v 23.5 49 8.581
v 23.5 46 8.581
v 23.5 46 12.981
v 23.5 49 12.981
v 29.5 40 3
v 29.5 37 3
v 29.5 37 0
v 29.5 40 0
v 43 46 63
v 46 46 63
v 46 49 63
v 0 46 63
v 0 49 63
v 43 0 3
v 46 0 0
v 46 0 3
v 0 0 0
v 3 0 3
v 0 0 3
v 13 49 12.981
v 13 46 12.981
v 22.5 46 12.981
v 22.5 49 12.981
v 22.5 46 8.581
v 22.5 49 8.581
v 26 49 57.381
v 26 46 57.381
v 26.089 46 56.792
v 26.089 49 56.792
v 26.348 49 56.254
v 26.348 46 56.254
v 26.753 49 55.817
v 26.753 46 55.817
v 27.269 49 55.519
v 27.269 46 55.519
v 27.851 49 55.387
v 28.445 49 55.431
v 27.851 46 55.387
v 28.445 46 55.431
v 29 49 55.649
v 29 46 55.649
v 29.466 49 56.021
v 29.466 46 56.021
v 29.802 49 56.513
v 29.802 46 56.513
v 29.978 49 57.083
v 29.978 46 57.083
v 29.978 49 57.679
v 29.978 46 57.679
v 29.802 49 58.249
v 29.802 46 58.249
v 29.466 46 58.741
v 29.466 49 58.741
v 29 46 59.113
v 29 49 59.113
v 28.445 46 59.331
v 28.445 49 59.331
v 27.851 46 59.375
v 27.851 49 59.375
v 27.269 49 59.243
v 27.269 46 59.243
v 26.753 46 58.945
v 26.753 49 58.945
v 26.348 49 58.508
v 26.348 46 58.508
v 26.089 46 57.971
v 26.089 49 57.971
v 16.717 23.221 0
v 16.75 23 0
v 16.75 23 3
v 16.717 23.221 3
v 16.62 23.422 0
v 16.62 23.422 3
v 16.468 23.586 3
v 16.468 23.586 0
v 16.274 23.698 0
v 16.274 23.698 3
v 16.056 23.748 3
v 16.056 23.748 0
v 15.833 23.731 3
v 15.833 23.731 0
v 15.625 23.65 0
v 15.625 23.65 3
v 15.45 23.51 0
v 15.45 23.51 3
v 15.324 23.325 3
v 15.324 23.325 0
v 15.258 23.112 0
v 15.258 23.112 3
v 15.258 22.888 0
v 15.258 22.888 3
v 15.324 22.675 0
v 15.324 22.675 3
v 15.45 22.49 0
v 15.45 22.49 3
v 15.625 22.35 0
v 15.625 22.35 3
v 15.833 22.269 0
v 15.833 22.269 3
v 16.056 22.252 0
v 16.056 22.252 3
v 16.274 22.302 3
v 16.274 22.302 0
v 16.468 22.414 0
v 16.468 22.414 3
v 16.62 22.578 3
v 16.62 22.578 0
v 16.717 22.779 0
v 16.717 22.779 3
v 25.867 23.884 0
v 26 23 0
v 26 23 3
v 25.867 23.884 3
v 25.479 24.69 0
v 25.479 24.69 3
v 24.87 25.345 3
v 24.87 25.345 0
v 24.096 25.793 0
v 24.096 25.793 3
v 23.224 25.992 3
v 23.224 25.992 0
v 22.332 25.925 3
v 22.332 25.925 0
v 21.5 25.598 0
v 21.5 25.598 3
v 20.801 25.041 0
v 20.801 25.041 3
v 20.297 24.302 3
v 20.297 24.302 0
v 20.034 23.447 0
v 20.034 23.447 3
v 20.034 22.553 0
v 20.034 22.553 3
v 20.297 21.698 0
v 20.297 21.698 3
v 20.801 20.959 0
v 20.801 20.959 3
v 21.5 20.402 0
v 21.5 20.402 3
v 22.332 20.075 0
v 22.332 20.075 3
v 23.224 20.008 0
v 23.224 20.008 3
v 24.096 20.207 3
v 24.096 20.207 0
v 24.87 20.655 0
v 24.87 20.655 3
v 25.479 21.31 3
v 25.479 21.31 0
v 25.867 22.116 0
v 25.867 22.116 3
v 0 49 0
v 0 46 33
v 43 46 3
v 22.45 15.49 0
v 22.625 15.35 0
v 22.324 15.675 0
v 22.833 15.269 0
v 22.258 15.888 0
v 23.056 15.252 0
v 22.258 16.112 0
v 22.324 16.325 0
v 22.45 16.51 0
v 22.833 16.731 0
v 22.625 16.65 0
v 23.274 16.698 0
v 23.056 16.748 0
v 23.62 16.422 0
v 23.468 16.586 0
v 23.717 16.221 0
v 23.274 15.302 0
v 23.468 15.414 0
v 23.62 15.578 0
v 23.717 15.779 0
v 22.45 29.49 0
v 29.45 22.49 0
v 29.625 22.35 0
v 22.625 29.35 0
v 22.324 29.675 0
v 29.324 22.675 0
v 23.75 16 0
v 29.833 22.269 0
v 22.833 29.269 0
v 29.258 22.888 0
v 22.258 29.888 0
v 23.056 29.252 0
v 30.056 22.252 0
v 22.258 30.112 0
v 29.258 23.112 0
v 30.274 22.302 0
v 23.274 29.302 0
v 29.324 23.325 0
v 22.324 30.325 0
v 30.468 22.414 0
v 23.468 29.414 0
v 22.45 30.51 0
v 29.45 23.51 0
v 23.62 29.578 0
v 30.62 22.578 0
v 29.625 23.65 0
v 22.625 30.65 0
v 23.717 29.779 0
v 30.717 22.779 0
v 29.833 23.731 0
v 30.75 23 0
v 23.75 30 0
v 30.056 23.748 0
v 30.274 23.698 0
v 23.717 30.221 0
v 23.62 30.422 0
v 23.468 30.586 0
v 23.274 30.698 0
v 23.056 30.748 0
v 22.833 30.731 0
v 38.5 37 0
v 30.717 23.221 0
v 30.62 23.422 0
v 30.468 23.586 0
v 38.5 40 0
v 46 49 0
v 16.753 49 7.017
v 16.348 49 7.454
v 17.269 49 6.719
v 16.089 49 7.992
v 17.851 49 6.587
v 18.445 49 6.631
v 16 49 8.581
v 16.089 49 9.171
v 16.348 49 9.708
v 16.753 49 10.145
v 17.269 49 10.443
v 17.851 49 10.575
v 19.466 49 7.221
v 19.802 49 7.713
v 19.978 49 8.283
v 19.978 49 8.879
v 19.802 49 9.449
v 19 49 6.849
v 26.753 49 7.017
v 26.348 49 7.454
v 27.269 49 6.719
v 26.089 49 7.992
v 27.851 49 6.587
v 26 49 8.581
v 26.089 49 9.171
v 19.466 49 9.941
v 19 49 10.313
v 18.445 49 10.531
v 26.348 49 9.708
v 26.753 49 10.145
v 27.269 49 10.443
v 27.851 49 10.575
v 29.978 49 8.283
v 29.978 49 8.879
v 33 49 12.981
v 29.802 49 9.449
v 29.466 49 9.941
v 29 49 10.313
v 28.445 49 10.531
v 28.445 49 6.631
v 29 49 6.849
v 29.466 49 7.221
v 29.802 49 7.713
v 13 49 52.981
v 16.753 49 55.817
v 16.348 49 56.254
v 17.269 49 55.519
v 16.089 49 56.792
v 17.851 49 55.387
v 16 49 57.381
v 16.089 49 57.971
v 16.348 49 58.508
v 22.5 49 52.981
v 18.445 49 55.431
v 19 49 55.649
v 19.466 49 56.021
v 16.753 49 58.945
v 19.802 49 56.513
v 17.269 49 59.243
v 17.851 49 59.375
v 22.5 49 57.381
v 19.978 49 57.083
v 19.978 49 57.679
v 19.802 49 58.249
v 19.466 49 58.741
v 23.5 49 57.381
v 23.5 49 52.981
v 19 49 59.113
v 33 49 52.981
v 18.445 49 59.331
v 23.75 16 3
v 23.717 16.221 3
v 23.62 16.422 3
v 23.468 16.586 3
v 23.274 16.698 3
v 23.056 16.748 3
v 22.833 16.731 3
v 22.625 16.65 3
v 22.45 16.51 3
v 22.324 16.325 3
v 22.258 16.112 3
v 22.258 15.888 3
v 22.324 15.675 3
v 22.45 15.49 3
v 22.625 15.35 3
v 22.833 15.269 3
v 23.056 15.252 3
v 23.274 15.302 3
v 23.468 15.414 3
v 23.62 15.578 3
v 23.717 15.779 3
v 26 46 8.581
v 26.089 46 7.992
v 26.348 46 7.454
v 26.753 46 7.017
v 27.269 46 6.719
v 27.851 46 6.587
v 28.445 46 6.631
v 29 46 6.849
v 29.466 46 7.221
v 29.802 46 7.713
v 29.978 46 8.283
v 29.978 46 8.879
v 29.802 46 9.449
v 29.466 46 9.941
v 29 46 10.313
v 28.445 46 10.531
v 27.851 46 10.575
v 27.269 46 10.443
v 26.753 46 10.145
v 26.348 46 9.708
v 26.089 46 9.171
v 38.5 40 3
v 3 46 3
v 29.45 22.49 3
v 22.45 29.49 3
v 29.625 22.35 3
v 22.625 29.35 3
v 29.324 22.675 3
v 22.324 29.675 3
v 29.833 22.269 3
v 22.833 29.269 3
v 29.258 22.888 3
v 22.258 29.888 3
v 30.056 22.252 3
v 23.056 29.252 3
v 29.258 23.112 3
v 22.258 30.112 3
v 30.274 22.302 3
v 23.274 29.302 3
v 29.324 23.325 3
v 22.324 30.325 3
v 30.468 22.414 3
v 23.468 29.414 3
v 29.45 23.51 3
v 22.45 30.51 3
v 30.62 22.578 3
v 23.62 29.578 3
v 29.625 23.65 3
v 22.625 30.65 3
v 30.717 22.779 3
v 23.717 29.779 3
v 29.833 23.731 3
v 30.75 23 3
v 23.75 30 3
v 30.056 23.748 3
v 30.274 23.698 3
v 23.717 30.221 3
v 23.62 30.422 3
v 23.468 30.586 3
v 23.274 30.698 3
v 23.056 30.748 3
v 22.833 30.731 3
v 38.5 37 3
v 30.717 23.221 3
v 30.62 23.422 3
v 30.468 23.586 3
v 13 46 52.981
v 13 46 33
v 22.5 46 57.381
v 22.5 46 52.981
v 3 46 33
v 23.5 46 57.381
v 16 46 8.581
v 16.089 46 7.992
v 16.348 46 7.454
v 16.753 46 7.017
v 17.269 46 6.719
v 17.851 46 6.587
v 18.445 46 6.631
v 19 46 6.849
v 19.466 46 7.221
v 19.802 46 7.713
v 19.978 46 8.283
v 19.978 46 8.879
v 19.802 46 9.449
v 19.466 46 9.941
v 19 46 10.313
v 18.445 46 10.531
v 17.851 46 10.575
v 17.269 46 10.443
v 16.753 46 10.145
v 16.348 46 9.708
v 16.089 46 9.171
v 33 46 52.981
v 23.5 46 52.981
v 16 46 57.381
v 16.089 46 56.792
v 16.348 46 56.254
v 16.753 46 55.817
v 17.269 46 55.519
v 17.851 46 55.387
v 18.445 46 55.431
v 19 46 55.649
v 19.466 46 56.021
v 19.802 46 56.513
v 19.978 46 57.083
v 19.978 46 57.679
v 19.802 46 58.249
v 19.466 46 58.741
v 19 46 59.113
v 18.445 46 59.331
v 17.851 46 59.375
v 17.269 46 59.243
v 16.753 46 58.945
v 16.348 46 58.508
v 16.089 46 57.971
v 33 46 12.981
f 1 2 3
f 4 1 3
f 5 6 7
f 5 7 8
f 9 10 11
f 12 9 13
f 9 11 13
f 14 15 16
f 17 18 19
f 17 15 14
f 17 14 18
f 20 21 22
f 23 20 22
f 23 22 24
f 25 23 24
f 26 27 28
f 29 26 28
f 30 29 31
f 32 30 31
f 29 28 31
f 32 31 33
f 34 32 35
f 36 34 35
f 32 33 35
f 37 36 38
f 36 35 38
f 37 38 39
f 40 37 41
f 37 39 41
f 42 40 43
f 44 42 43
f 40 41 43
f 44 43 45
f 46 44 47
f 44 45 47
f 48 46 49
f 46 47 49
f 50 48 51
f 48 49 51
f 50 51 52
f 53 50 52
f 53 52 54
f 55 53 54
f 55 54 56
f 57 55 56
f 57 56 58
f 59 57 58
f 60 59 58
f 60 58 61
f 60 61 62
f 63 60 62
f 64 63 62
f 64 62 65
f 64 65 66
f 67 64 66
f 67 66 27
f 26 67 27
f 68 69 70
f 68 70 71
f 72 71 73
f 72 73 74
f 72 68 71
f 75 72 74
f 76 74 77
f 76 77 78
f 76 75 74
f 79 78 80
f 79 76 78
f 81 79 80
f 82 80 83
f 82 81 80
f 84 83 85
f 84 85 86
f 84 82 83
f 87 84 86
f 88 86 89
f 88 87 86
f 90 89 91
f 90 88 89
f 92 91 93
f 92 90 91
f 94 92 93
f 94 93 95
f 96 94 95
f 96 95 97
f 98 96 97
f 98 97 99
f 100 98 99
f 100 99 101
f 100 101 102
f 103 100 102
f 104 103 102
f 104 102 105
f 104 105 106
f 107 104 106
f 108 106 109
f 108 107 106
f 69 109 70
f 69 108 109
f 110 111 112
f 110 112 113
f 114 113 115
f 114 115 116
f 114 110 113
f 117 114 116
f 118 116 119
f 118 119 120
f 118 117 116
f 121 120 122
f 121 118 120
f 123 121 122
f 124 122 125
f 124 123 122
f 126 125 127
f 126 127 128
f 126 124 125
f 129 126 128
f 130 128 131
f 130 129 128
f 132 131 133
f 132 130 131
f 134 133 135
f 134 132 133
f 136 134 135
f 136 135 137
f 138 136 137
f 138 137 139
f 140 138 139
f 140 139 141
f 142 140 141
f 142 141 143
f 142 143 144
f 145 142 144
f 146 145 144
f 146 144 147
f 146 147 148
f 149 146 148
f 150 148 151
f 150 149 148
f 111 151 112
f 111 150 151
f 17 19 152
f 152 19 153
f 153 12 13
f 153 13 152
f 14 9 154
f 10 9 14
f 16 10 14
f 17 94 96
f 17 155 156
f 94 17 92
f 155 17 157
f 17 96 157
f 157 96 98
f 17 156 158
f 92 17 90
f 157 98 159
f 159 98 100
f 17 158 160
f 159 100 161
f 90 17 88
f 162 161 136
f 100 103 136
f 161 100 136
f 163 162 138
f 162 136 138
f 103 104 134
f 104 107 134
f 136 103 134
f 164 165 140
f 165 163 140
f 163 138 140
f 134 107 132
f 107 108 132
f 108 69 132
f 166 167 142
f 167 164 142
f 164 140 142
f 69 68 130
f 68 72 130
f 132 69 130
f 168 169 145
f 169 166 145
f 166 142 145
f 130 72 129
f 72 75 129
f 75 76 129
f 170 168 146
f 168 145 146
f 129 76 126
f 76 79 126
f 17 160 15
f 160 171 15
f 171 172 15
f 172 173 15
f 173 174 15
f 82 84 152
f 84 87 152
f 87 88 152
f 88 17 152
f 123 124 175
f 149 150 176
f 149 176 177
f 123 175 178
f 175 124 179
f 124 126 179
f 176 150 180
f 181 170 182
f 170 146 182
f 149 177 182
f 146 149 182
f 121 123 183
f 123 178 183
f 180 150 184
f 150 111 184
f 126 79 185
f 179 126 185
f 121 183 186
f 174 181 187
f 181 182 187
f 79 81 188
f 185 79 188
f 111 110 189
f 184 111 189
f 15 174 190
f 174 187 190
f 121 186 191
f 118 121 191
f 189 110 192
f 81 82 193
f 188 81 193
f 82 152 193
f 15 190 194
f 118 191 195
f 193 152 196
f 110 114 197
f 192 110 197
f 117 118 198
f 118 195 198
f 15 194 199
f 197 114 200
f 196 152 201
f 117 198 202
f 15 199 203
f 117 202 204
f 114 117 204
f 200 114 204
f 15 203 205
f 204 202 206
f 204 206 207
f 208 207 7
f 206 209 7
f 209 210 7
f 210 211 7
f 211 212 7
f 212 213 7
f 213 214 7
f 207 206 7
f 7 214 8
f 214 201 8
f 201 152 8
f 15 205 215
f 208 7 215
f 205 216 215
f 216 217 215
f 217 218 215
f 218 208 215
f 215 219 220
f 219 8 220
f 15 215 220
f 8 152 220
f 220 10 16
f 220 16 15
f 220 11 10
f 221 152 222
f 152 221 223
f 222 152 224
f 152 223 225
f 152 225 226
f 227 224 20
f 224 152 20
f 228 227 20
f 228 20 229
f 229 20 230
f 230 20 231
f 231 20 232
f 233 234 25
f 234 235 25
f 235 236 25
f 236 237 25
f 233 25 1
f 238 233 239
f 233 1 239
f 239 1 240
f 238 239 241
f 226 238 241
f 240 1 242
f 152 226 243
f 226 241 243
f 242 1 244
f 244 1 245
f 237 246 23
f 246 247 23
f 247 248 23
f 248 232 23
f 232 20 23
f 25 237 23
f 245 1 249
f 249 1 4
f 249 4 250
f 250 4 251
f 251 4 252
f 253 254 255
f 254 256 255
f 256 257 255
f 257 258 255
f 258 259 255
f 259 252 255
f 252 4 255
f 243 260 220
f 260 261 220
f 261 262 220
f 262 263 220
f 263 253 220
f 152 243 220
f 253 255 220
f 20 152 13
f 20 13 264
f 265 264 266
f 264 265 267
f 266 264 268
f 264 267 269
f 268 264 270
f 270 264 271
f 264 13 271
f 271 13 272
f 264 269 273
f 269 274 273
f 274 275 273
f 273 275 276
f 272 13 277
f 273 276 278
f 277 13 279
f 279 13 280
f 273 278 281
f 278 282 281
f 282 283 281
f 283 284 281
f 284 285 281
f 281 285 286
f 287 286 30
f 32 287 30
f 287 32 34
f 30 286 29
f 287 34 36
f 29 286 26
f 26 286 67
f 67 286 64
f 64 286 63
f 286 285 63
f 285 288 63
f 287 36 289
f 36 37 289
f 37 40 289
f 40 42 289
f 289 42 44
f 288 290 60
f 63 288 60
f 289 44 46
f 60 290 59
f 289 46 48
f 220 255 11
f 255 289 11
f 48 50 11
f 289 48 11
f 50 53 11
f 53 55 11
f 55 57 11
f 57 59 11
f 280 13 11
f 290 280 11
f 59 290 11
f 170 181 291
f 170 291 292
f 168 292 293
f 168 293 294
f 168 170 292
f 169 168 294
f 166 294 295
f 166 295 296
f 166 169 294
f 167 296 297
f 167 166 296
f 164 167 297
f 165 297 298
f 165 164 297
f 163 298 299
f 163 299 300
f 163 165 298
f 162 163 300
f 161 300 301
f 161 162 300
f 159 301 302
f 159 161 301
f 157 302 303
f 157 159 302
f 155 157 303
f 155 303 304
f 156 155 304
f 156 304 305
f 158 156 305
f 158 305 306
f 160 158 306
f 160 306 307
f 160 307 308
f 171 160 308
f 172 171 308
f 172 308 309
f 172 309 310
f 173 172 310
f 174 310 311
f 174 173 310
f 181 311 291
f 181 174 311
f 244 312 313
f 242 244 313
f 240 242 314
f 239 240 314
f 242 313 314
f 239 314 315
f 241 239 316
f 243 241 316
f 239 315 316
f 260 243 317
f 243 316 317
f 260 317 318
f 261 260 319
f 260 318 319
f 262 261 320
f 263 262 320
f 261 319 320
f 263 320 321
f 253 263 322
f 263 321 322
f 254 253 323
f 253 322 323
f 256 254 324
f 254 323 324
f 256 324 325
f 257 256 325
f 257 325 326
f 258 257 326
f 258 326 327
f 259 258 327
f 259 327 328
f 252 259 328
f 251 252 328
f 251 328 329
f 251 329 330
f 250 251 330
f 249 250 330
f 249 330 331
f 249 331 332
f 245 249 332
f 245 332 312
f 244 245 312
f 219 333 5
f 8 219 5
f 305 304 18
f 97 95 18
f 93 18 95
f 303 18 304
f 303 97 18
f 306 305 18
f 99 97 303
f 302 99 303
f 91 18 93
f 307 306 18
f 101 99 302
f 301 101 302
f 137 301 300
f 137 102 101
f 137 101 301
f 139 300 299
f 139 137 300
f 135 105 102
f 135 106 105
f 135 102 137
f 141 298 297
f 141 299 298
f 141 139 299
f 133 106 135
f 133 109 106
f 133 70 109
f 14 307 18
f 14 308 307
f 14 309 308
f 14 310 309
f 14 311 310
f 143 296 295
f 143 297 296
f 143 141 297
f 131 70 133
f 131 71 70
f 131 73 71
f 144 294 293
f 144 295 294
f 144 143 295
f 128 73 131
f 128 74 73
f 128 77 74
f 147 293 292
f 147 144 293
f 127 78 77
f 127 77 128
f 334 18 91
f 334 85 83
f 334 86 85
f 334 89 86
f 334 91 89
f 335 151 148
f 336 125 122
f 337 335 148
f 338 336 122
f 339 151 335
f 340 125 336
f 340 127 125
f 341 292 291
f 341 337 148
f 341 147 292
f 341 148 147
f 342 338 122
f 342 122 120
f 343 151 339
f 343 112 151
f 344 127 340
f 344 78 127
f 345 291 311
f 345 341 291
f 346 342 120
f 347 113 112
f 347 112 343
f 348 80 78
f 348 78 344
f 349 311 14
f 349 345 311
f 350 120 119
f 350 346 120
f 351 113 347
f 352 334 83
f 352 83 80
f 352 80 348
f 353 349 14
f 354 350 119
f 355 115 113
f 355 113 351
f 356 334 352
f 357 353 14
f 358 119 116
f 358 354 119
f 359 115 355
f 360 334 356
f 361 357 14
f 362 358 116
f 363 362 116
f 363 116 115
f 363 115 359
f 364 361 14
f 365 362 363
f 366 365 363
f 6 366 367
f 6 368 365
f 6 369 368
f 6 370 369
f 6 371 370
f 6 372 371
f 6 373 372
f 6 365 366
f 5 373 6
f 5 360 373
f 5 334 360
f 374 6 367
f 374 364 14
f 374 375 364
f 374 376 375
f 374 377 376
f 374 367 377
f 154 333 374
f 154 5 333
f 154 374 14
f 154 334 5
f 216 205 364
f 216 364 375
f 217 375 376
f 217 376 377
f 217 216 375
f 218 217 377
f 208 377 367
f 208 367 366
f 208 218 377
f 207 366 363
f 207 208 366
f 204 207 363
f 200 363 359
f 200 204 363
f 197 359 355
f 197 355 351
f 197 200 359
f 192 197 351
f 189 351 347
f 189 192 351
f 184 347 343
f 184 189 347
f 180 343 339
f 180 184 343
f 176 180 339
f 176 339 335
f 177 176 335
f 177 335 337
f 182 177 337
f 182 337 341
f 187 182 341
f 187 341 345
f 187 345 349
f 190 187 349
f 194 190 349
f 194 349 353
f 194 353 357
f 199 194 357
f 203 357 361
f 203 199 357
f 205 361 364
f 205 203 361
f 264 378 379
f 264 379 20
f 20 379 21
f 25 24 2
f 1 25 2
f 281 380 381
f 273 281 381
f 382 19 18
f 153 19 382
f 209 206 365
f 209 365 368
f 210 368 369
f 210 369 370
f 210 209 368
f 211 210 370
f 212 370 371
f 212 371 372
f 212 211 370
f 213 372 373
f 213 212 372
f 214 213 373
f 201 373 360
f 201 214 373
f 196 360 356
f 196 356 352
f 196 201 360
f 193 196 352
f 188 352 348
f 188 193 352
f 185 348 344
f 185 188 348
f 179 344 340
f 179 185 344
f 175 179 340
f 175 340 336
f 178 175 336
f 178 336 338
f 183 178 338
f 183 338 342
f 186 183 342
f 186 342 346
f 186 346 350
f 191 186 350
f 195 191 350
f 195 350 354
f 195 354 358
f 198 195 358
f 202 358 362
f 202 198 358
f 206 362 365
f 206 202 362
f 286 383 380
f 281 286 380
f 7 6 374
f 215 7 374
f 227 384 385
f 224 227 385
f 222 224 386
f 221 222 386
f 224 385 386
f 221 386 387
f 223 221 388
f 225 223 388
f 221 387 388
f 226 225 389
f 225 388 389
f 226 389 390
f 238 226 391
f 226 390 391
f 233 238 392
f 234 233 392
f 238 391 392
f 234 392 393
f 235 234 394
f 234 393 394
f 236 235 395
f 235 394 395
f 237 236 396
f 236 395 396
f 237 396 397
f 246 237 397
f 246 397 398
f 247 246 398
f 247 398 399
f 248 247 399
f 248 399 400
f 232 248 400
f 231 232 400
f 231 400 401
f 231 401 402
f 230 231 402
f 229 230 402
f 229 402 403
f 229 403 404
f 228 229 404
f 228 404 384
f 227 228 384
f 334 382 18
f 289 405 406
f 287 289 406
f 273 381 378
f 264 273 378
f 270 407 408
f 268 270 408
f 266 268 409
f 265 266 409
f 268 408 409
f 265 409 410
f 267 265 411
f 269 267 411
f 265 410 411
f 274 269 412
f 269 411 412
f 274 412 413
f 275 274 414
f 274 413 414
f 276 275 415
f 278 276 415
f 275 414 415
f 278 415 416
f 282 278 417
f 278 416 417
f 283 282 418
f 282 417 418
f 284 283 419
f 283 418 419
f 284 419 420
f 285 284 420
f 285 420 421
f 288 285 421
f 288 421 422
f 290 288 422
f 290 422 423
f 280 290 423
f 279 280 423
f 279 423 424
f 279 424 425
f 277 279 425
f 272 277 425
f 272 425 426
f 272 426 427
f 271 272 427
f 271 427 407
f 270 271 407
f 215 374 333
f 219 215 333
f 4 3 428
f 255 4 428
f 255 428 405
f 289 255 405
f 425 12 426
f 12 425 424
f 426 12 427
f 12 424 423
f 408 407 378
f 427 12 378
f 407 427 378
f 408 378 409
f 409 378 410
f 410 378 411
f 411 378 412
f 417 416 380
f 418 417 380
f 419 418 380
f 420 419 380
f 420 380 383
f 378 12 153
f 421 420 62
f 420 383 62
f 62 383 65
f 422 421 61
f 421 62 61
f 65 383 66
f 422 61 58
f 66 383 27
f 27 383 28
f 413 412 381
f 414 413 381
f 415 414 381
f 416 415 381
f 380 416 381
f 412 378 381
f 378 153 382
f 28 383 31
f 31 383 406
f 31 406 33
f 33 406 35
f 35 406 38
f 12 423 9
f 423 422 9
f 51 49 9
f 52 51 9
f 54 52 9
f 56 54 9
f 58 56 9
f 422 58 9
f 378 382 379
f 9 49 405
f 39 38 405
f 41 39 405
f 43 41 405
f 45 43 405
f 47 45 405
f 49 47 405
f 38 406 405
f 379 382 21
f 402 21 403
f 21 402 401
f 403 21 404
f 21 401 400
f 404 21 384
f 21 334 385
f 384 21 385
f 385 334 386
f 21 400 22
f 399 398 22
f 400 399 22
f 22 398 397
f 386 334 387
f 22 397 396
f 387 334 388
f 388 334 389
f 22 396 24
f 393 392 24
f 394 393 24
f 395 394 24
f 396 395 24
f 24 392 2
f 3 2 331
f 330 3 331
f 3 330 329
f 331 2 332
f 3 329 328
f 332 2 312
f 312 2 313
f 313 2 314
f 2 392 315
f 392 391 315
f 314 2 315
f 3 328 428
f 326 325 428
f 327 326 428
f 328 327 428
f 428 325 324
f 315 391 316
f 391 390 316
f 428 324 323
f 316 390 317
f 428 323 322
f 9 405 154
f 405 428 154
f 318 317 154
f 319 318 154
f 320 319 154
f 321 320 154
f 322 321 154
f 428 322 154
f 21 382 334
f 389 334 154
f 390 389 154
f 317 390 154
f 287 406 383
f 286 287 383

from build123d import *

# Parameters (mm, degrees)
SKETCH1_W                = 46
SKETCH1_H                = 46
SKETCH1_R                = 3
SKETCH1_R_2              = 0.75
BOSS_EXTRUDE1_DEPTH      = 3
SKETCH2_W                = 46
SKETCH2_H                = 3
BOSS_EXTRUDE2_DEPTH      = 60
BOSS_EXTRUDE2_DEPTH_BACK = 3
SKETCH3_R                = 2
CUT_EXTRUDE1_DEPTH       = 10
SKETCH4_W                = 3
SKETCH4_H                = 60
SKETCH4_H_2              = 30
BOSS_EXTRUDE3_DEPTH      = 46
CUT_EXTRUDE2_DEPTH       = 46
CUT_EXTRUDE2_DEPTH_BACK  = 46
CUT_EXTRUDE3_DEPTH       = 15
SKETCH7_W                = 4.5
SKETCH7_H                = 3
CUT_EXTRUDE4_DEPTH       = 10


with BuildPart() as part:
    # Sketch1 → Boss-Extrude1 (new body)
    with BuildSketch(Plane.XY):
        with Locations((23, 23)):
            Rectangle(SKETCH1_W, SKETCH1_H)
        with Locations((23, 23)):
            Circle(SKETCH1_R, mode=Mode.SUBTRACT)
        with Locations((30, 23)):
            Circle(SKETCH1_R_2, mode=Mode.SUBTRACT)
        with Locations((23, 30)):
            Circle(SKETCH1_R_2, mode=Mode.SUBTRACT)
        with Locations((16, 23)):
            Circle(SKETCH1_R_2, mode=Mode.SUBTRACT)
        with Locations((23, 16)):
            Circle(SKETCH1_R_2, mode=Mode.SUBTRACT)
    extrude(amount=BOSS_EXTRUDE1_DEPTH)

    # Sketch2 → Boss-Extrude2 (add, two sides)
    with BuildSketch(Plane.XY.offset(3)) as boss_extrude2_sk:
        with Locations((23, 47.5)):
            Rectangle(SKETCH2_W, SKETCH2_H)
    extrude(amount=BOSS_EXTRUDE2_DEPTH)
    extrude(boss_extrude2_sk.sketch, amount=-BOSS_EXTRUDE2_DEPTH_BACK)

    # Sketch3 → Cut-Extrude1 (cut)
    with BuildSketch(Plane(origin=(0, 46, 0), x_dir=(-1, 0, 0), z_dir=(0, -1, 0))):
        with Locations((-18, -8.581054425)):
            Circle(SKETCH3_R)
        with Locations((-18, -57.381054425)):
            Circle(SKETCH3_R)
        with Locations((-28, -57.381054425)):
            Circle(SKETCH3_R)
        with Locations((-28, -8.581054425)):
            Circle(SKETCH3_R)
        Polygon((-22.5, -12.981054425), (-22.5, -8.581054425), (-23.5, -8.581054425), (-23.5, -12.981054425), (-33, -12.981054425), (-33, -52.981054425), (-23.5, -52.981054425), (-23.5, -57.381054425), (-22.5, -57.381054425), (-22.5, -52.981054425), (-13, -52.981054425), (-13, -12.981054425), align=None)
    extrude(amount=-CUT_EXTRUDE1_DEPTH, mode=Mode.SUBTRACT)

    # Sketch4 → Boss-Extrude3 (add)
    with BuildSketch(Plane(origin=(0, 46, 0), x_dir=(-1, 0, 0), z_dir=(0, -1, 0))):
        with Locations((-44.5, -33)):
            Rectangle(SKETCH4_W, SKETCH4_H)
        with Locations((-1.5, -18)):
            Rectangle(SKETCH4_W, SKETCH4_H_2)
    extrude(amount=BOSS_EXTRUDE3_DEPTH)

    # Sketch5 → Cut-Extrude2 (cut, two sides)
    with BuildSketch(Plane.ZY.offset(-43)) as cut_extrude2_sk:
        Polygon((63, 46), (3, 0), (63, 0), align=None)
    extrude(amount=CUT_EXTRUDE2_DEPTH, mode=Mode.SUBTRACT)
    extrude(cut_extrude2_sk.sketch, amount=-CUT_EXTRUDE2_DEPTH_BACK, mode=Mode.SUBTRACT)

    # Sketch6 → Cut-Extrude3 (cut)
    with BuildSketch(Plane.ZY):
        Polygon((3, 0), (33, 46), (33, 23), align=None)
    extrude(amount=-CUT_EXTRUDE3_DEPTH, mode=Mode.SUBTRACT)

    # Sketch7 → Cut-Extrude4 (cut)
    with BuildSketch(Plane.XY.offset(3)):
        with Locations((36.25, 38.5)):
            Rectangle(SKETCH7_W, SKETCH7_H)
        with Locations((31.75, 38.5)):
            Rectangle(SKETCH7_W, SKETCH7_H)
    extrude(amount=-CUT_EXTRUDE4_DEPTH, mode=Mode.SUBTRACT)


solid = part.part
